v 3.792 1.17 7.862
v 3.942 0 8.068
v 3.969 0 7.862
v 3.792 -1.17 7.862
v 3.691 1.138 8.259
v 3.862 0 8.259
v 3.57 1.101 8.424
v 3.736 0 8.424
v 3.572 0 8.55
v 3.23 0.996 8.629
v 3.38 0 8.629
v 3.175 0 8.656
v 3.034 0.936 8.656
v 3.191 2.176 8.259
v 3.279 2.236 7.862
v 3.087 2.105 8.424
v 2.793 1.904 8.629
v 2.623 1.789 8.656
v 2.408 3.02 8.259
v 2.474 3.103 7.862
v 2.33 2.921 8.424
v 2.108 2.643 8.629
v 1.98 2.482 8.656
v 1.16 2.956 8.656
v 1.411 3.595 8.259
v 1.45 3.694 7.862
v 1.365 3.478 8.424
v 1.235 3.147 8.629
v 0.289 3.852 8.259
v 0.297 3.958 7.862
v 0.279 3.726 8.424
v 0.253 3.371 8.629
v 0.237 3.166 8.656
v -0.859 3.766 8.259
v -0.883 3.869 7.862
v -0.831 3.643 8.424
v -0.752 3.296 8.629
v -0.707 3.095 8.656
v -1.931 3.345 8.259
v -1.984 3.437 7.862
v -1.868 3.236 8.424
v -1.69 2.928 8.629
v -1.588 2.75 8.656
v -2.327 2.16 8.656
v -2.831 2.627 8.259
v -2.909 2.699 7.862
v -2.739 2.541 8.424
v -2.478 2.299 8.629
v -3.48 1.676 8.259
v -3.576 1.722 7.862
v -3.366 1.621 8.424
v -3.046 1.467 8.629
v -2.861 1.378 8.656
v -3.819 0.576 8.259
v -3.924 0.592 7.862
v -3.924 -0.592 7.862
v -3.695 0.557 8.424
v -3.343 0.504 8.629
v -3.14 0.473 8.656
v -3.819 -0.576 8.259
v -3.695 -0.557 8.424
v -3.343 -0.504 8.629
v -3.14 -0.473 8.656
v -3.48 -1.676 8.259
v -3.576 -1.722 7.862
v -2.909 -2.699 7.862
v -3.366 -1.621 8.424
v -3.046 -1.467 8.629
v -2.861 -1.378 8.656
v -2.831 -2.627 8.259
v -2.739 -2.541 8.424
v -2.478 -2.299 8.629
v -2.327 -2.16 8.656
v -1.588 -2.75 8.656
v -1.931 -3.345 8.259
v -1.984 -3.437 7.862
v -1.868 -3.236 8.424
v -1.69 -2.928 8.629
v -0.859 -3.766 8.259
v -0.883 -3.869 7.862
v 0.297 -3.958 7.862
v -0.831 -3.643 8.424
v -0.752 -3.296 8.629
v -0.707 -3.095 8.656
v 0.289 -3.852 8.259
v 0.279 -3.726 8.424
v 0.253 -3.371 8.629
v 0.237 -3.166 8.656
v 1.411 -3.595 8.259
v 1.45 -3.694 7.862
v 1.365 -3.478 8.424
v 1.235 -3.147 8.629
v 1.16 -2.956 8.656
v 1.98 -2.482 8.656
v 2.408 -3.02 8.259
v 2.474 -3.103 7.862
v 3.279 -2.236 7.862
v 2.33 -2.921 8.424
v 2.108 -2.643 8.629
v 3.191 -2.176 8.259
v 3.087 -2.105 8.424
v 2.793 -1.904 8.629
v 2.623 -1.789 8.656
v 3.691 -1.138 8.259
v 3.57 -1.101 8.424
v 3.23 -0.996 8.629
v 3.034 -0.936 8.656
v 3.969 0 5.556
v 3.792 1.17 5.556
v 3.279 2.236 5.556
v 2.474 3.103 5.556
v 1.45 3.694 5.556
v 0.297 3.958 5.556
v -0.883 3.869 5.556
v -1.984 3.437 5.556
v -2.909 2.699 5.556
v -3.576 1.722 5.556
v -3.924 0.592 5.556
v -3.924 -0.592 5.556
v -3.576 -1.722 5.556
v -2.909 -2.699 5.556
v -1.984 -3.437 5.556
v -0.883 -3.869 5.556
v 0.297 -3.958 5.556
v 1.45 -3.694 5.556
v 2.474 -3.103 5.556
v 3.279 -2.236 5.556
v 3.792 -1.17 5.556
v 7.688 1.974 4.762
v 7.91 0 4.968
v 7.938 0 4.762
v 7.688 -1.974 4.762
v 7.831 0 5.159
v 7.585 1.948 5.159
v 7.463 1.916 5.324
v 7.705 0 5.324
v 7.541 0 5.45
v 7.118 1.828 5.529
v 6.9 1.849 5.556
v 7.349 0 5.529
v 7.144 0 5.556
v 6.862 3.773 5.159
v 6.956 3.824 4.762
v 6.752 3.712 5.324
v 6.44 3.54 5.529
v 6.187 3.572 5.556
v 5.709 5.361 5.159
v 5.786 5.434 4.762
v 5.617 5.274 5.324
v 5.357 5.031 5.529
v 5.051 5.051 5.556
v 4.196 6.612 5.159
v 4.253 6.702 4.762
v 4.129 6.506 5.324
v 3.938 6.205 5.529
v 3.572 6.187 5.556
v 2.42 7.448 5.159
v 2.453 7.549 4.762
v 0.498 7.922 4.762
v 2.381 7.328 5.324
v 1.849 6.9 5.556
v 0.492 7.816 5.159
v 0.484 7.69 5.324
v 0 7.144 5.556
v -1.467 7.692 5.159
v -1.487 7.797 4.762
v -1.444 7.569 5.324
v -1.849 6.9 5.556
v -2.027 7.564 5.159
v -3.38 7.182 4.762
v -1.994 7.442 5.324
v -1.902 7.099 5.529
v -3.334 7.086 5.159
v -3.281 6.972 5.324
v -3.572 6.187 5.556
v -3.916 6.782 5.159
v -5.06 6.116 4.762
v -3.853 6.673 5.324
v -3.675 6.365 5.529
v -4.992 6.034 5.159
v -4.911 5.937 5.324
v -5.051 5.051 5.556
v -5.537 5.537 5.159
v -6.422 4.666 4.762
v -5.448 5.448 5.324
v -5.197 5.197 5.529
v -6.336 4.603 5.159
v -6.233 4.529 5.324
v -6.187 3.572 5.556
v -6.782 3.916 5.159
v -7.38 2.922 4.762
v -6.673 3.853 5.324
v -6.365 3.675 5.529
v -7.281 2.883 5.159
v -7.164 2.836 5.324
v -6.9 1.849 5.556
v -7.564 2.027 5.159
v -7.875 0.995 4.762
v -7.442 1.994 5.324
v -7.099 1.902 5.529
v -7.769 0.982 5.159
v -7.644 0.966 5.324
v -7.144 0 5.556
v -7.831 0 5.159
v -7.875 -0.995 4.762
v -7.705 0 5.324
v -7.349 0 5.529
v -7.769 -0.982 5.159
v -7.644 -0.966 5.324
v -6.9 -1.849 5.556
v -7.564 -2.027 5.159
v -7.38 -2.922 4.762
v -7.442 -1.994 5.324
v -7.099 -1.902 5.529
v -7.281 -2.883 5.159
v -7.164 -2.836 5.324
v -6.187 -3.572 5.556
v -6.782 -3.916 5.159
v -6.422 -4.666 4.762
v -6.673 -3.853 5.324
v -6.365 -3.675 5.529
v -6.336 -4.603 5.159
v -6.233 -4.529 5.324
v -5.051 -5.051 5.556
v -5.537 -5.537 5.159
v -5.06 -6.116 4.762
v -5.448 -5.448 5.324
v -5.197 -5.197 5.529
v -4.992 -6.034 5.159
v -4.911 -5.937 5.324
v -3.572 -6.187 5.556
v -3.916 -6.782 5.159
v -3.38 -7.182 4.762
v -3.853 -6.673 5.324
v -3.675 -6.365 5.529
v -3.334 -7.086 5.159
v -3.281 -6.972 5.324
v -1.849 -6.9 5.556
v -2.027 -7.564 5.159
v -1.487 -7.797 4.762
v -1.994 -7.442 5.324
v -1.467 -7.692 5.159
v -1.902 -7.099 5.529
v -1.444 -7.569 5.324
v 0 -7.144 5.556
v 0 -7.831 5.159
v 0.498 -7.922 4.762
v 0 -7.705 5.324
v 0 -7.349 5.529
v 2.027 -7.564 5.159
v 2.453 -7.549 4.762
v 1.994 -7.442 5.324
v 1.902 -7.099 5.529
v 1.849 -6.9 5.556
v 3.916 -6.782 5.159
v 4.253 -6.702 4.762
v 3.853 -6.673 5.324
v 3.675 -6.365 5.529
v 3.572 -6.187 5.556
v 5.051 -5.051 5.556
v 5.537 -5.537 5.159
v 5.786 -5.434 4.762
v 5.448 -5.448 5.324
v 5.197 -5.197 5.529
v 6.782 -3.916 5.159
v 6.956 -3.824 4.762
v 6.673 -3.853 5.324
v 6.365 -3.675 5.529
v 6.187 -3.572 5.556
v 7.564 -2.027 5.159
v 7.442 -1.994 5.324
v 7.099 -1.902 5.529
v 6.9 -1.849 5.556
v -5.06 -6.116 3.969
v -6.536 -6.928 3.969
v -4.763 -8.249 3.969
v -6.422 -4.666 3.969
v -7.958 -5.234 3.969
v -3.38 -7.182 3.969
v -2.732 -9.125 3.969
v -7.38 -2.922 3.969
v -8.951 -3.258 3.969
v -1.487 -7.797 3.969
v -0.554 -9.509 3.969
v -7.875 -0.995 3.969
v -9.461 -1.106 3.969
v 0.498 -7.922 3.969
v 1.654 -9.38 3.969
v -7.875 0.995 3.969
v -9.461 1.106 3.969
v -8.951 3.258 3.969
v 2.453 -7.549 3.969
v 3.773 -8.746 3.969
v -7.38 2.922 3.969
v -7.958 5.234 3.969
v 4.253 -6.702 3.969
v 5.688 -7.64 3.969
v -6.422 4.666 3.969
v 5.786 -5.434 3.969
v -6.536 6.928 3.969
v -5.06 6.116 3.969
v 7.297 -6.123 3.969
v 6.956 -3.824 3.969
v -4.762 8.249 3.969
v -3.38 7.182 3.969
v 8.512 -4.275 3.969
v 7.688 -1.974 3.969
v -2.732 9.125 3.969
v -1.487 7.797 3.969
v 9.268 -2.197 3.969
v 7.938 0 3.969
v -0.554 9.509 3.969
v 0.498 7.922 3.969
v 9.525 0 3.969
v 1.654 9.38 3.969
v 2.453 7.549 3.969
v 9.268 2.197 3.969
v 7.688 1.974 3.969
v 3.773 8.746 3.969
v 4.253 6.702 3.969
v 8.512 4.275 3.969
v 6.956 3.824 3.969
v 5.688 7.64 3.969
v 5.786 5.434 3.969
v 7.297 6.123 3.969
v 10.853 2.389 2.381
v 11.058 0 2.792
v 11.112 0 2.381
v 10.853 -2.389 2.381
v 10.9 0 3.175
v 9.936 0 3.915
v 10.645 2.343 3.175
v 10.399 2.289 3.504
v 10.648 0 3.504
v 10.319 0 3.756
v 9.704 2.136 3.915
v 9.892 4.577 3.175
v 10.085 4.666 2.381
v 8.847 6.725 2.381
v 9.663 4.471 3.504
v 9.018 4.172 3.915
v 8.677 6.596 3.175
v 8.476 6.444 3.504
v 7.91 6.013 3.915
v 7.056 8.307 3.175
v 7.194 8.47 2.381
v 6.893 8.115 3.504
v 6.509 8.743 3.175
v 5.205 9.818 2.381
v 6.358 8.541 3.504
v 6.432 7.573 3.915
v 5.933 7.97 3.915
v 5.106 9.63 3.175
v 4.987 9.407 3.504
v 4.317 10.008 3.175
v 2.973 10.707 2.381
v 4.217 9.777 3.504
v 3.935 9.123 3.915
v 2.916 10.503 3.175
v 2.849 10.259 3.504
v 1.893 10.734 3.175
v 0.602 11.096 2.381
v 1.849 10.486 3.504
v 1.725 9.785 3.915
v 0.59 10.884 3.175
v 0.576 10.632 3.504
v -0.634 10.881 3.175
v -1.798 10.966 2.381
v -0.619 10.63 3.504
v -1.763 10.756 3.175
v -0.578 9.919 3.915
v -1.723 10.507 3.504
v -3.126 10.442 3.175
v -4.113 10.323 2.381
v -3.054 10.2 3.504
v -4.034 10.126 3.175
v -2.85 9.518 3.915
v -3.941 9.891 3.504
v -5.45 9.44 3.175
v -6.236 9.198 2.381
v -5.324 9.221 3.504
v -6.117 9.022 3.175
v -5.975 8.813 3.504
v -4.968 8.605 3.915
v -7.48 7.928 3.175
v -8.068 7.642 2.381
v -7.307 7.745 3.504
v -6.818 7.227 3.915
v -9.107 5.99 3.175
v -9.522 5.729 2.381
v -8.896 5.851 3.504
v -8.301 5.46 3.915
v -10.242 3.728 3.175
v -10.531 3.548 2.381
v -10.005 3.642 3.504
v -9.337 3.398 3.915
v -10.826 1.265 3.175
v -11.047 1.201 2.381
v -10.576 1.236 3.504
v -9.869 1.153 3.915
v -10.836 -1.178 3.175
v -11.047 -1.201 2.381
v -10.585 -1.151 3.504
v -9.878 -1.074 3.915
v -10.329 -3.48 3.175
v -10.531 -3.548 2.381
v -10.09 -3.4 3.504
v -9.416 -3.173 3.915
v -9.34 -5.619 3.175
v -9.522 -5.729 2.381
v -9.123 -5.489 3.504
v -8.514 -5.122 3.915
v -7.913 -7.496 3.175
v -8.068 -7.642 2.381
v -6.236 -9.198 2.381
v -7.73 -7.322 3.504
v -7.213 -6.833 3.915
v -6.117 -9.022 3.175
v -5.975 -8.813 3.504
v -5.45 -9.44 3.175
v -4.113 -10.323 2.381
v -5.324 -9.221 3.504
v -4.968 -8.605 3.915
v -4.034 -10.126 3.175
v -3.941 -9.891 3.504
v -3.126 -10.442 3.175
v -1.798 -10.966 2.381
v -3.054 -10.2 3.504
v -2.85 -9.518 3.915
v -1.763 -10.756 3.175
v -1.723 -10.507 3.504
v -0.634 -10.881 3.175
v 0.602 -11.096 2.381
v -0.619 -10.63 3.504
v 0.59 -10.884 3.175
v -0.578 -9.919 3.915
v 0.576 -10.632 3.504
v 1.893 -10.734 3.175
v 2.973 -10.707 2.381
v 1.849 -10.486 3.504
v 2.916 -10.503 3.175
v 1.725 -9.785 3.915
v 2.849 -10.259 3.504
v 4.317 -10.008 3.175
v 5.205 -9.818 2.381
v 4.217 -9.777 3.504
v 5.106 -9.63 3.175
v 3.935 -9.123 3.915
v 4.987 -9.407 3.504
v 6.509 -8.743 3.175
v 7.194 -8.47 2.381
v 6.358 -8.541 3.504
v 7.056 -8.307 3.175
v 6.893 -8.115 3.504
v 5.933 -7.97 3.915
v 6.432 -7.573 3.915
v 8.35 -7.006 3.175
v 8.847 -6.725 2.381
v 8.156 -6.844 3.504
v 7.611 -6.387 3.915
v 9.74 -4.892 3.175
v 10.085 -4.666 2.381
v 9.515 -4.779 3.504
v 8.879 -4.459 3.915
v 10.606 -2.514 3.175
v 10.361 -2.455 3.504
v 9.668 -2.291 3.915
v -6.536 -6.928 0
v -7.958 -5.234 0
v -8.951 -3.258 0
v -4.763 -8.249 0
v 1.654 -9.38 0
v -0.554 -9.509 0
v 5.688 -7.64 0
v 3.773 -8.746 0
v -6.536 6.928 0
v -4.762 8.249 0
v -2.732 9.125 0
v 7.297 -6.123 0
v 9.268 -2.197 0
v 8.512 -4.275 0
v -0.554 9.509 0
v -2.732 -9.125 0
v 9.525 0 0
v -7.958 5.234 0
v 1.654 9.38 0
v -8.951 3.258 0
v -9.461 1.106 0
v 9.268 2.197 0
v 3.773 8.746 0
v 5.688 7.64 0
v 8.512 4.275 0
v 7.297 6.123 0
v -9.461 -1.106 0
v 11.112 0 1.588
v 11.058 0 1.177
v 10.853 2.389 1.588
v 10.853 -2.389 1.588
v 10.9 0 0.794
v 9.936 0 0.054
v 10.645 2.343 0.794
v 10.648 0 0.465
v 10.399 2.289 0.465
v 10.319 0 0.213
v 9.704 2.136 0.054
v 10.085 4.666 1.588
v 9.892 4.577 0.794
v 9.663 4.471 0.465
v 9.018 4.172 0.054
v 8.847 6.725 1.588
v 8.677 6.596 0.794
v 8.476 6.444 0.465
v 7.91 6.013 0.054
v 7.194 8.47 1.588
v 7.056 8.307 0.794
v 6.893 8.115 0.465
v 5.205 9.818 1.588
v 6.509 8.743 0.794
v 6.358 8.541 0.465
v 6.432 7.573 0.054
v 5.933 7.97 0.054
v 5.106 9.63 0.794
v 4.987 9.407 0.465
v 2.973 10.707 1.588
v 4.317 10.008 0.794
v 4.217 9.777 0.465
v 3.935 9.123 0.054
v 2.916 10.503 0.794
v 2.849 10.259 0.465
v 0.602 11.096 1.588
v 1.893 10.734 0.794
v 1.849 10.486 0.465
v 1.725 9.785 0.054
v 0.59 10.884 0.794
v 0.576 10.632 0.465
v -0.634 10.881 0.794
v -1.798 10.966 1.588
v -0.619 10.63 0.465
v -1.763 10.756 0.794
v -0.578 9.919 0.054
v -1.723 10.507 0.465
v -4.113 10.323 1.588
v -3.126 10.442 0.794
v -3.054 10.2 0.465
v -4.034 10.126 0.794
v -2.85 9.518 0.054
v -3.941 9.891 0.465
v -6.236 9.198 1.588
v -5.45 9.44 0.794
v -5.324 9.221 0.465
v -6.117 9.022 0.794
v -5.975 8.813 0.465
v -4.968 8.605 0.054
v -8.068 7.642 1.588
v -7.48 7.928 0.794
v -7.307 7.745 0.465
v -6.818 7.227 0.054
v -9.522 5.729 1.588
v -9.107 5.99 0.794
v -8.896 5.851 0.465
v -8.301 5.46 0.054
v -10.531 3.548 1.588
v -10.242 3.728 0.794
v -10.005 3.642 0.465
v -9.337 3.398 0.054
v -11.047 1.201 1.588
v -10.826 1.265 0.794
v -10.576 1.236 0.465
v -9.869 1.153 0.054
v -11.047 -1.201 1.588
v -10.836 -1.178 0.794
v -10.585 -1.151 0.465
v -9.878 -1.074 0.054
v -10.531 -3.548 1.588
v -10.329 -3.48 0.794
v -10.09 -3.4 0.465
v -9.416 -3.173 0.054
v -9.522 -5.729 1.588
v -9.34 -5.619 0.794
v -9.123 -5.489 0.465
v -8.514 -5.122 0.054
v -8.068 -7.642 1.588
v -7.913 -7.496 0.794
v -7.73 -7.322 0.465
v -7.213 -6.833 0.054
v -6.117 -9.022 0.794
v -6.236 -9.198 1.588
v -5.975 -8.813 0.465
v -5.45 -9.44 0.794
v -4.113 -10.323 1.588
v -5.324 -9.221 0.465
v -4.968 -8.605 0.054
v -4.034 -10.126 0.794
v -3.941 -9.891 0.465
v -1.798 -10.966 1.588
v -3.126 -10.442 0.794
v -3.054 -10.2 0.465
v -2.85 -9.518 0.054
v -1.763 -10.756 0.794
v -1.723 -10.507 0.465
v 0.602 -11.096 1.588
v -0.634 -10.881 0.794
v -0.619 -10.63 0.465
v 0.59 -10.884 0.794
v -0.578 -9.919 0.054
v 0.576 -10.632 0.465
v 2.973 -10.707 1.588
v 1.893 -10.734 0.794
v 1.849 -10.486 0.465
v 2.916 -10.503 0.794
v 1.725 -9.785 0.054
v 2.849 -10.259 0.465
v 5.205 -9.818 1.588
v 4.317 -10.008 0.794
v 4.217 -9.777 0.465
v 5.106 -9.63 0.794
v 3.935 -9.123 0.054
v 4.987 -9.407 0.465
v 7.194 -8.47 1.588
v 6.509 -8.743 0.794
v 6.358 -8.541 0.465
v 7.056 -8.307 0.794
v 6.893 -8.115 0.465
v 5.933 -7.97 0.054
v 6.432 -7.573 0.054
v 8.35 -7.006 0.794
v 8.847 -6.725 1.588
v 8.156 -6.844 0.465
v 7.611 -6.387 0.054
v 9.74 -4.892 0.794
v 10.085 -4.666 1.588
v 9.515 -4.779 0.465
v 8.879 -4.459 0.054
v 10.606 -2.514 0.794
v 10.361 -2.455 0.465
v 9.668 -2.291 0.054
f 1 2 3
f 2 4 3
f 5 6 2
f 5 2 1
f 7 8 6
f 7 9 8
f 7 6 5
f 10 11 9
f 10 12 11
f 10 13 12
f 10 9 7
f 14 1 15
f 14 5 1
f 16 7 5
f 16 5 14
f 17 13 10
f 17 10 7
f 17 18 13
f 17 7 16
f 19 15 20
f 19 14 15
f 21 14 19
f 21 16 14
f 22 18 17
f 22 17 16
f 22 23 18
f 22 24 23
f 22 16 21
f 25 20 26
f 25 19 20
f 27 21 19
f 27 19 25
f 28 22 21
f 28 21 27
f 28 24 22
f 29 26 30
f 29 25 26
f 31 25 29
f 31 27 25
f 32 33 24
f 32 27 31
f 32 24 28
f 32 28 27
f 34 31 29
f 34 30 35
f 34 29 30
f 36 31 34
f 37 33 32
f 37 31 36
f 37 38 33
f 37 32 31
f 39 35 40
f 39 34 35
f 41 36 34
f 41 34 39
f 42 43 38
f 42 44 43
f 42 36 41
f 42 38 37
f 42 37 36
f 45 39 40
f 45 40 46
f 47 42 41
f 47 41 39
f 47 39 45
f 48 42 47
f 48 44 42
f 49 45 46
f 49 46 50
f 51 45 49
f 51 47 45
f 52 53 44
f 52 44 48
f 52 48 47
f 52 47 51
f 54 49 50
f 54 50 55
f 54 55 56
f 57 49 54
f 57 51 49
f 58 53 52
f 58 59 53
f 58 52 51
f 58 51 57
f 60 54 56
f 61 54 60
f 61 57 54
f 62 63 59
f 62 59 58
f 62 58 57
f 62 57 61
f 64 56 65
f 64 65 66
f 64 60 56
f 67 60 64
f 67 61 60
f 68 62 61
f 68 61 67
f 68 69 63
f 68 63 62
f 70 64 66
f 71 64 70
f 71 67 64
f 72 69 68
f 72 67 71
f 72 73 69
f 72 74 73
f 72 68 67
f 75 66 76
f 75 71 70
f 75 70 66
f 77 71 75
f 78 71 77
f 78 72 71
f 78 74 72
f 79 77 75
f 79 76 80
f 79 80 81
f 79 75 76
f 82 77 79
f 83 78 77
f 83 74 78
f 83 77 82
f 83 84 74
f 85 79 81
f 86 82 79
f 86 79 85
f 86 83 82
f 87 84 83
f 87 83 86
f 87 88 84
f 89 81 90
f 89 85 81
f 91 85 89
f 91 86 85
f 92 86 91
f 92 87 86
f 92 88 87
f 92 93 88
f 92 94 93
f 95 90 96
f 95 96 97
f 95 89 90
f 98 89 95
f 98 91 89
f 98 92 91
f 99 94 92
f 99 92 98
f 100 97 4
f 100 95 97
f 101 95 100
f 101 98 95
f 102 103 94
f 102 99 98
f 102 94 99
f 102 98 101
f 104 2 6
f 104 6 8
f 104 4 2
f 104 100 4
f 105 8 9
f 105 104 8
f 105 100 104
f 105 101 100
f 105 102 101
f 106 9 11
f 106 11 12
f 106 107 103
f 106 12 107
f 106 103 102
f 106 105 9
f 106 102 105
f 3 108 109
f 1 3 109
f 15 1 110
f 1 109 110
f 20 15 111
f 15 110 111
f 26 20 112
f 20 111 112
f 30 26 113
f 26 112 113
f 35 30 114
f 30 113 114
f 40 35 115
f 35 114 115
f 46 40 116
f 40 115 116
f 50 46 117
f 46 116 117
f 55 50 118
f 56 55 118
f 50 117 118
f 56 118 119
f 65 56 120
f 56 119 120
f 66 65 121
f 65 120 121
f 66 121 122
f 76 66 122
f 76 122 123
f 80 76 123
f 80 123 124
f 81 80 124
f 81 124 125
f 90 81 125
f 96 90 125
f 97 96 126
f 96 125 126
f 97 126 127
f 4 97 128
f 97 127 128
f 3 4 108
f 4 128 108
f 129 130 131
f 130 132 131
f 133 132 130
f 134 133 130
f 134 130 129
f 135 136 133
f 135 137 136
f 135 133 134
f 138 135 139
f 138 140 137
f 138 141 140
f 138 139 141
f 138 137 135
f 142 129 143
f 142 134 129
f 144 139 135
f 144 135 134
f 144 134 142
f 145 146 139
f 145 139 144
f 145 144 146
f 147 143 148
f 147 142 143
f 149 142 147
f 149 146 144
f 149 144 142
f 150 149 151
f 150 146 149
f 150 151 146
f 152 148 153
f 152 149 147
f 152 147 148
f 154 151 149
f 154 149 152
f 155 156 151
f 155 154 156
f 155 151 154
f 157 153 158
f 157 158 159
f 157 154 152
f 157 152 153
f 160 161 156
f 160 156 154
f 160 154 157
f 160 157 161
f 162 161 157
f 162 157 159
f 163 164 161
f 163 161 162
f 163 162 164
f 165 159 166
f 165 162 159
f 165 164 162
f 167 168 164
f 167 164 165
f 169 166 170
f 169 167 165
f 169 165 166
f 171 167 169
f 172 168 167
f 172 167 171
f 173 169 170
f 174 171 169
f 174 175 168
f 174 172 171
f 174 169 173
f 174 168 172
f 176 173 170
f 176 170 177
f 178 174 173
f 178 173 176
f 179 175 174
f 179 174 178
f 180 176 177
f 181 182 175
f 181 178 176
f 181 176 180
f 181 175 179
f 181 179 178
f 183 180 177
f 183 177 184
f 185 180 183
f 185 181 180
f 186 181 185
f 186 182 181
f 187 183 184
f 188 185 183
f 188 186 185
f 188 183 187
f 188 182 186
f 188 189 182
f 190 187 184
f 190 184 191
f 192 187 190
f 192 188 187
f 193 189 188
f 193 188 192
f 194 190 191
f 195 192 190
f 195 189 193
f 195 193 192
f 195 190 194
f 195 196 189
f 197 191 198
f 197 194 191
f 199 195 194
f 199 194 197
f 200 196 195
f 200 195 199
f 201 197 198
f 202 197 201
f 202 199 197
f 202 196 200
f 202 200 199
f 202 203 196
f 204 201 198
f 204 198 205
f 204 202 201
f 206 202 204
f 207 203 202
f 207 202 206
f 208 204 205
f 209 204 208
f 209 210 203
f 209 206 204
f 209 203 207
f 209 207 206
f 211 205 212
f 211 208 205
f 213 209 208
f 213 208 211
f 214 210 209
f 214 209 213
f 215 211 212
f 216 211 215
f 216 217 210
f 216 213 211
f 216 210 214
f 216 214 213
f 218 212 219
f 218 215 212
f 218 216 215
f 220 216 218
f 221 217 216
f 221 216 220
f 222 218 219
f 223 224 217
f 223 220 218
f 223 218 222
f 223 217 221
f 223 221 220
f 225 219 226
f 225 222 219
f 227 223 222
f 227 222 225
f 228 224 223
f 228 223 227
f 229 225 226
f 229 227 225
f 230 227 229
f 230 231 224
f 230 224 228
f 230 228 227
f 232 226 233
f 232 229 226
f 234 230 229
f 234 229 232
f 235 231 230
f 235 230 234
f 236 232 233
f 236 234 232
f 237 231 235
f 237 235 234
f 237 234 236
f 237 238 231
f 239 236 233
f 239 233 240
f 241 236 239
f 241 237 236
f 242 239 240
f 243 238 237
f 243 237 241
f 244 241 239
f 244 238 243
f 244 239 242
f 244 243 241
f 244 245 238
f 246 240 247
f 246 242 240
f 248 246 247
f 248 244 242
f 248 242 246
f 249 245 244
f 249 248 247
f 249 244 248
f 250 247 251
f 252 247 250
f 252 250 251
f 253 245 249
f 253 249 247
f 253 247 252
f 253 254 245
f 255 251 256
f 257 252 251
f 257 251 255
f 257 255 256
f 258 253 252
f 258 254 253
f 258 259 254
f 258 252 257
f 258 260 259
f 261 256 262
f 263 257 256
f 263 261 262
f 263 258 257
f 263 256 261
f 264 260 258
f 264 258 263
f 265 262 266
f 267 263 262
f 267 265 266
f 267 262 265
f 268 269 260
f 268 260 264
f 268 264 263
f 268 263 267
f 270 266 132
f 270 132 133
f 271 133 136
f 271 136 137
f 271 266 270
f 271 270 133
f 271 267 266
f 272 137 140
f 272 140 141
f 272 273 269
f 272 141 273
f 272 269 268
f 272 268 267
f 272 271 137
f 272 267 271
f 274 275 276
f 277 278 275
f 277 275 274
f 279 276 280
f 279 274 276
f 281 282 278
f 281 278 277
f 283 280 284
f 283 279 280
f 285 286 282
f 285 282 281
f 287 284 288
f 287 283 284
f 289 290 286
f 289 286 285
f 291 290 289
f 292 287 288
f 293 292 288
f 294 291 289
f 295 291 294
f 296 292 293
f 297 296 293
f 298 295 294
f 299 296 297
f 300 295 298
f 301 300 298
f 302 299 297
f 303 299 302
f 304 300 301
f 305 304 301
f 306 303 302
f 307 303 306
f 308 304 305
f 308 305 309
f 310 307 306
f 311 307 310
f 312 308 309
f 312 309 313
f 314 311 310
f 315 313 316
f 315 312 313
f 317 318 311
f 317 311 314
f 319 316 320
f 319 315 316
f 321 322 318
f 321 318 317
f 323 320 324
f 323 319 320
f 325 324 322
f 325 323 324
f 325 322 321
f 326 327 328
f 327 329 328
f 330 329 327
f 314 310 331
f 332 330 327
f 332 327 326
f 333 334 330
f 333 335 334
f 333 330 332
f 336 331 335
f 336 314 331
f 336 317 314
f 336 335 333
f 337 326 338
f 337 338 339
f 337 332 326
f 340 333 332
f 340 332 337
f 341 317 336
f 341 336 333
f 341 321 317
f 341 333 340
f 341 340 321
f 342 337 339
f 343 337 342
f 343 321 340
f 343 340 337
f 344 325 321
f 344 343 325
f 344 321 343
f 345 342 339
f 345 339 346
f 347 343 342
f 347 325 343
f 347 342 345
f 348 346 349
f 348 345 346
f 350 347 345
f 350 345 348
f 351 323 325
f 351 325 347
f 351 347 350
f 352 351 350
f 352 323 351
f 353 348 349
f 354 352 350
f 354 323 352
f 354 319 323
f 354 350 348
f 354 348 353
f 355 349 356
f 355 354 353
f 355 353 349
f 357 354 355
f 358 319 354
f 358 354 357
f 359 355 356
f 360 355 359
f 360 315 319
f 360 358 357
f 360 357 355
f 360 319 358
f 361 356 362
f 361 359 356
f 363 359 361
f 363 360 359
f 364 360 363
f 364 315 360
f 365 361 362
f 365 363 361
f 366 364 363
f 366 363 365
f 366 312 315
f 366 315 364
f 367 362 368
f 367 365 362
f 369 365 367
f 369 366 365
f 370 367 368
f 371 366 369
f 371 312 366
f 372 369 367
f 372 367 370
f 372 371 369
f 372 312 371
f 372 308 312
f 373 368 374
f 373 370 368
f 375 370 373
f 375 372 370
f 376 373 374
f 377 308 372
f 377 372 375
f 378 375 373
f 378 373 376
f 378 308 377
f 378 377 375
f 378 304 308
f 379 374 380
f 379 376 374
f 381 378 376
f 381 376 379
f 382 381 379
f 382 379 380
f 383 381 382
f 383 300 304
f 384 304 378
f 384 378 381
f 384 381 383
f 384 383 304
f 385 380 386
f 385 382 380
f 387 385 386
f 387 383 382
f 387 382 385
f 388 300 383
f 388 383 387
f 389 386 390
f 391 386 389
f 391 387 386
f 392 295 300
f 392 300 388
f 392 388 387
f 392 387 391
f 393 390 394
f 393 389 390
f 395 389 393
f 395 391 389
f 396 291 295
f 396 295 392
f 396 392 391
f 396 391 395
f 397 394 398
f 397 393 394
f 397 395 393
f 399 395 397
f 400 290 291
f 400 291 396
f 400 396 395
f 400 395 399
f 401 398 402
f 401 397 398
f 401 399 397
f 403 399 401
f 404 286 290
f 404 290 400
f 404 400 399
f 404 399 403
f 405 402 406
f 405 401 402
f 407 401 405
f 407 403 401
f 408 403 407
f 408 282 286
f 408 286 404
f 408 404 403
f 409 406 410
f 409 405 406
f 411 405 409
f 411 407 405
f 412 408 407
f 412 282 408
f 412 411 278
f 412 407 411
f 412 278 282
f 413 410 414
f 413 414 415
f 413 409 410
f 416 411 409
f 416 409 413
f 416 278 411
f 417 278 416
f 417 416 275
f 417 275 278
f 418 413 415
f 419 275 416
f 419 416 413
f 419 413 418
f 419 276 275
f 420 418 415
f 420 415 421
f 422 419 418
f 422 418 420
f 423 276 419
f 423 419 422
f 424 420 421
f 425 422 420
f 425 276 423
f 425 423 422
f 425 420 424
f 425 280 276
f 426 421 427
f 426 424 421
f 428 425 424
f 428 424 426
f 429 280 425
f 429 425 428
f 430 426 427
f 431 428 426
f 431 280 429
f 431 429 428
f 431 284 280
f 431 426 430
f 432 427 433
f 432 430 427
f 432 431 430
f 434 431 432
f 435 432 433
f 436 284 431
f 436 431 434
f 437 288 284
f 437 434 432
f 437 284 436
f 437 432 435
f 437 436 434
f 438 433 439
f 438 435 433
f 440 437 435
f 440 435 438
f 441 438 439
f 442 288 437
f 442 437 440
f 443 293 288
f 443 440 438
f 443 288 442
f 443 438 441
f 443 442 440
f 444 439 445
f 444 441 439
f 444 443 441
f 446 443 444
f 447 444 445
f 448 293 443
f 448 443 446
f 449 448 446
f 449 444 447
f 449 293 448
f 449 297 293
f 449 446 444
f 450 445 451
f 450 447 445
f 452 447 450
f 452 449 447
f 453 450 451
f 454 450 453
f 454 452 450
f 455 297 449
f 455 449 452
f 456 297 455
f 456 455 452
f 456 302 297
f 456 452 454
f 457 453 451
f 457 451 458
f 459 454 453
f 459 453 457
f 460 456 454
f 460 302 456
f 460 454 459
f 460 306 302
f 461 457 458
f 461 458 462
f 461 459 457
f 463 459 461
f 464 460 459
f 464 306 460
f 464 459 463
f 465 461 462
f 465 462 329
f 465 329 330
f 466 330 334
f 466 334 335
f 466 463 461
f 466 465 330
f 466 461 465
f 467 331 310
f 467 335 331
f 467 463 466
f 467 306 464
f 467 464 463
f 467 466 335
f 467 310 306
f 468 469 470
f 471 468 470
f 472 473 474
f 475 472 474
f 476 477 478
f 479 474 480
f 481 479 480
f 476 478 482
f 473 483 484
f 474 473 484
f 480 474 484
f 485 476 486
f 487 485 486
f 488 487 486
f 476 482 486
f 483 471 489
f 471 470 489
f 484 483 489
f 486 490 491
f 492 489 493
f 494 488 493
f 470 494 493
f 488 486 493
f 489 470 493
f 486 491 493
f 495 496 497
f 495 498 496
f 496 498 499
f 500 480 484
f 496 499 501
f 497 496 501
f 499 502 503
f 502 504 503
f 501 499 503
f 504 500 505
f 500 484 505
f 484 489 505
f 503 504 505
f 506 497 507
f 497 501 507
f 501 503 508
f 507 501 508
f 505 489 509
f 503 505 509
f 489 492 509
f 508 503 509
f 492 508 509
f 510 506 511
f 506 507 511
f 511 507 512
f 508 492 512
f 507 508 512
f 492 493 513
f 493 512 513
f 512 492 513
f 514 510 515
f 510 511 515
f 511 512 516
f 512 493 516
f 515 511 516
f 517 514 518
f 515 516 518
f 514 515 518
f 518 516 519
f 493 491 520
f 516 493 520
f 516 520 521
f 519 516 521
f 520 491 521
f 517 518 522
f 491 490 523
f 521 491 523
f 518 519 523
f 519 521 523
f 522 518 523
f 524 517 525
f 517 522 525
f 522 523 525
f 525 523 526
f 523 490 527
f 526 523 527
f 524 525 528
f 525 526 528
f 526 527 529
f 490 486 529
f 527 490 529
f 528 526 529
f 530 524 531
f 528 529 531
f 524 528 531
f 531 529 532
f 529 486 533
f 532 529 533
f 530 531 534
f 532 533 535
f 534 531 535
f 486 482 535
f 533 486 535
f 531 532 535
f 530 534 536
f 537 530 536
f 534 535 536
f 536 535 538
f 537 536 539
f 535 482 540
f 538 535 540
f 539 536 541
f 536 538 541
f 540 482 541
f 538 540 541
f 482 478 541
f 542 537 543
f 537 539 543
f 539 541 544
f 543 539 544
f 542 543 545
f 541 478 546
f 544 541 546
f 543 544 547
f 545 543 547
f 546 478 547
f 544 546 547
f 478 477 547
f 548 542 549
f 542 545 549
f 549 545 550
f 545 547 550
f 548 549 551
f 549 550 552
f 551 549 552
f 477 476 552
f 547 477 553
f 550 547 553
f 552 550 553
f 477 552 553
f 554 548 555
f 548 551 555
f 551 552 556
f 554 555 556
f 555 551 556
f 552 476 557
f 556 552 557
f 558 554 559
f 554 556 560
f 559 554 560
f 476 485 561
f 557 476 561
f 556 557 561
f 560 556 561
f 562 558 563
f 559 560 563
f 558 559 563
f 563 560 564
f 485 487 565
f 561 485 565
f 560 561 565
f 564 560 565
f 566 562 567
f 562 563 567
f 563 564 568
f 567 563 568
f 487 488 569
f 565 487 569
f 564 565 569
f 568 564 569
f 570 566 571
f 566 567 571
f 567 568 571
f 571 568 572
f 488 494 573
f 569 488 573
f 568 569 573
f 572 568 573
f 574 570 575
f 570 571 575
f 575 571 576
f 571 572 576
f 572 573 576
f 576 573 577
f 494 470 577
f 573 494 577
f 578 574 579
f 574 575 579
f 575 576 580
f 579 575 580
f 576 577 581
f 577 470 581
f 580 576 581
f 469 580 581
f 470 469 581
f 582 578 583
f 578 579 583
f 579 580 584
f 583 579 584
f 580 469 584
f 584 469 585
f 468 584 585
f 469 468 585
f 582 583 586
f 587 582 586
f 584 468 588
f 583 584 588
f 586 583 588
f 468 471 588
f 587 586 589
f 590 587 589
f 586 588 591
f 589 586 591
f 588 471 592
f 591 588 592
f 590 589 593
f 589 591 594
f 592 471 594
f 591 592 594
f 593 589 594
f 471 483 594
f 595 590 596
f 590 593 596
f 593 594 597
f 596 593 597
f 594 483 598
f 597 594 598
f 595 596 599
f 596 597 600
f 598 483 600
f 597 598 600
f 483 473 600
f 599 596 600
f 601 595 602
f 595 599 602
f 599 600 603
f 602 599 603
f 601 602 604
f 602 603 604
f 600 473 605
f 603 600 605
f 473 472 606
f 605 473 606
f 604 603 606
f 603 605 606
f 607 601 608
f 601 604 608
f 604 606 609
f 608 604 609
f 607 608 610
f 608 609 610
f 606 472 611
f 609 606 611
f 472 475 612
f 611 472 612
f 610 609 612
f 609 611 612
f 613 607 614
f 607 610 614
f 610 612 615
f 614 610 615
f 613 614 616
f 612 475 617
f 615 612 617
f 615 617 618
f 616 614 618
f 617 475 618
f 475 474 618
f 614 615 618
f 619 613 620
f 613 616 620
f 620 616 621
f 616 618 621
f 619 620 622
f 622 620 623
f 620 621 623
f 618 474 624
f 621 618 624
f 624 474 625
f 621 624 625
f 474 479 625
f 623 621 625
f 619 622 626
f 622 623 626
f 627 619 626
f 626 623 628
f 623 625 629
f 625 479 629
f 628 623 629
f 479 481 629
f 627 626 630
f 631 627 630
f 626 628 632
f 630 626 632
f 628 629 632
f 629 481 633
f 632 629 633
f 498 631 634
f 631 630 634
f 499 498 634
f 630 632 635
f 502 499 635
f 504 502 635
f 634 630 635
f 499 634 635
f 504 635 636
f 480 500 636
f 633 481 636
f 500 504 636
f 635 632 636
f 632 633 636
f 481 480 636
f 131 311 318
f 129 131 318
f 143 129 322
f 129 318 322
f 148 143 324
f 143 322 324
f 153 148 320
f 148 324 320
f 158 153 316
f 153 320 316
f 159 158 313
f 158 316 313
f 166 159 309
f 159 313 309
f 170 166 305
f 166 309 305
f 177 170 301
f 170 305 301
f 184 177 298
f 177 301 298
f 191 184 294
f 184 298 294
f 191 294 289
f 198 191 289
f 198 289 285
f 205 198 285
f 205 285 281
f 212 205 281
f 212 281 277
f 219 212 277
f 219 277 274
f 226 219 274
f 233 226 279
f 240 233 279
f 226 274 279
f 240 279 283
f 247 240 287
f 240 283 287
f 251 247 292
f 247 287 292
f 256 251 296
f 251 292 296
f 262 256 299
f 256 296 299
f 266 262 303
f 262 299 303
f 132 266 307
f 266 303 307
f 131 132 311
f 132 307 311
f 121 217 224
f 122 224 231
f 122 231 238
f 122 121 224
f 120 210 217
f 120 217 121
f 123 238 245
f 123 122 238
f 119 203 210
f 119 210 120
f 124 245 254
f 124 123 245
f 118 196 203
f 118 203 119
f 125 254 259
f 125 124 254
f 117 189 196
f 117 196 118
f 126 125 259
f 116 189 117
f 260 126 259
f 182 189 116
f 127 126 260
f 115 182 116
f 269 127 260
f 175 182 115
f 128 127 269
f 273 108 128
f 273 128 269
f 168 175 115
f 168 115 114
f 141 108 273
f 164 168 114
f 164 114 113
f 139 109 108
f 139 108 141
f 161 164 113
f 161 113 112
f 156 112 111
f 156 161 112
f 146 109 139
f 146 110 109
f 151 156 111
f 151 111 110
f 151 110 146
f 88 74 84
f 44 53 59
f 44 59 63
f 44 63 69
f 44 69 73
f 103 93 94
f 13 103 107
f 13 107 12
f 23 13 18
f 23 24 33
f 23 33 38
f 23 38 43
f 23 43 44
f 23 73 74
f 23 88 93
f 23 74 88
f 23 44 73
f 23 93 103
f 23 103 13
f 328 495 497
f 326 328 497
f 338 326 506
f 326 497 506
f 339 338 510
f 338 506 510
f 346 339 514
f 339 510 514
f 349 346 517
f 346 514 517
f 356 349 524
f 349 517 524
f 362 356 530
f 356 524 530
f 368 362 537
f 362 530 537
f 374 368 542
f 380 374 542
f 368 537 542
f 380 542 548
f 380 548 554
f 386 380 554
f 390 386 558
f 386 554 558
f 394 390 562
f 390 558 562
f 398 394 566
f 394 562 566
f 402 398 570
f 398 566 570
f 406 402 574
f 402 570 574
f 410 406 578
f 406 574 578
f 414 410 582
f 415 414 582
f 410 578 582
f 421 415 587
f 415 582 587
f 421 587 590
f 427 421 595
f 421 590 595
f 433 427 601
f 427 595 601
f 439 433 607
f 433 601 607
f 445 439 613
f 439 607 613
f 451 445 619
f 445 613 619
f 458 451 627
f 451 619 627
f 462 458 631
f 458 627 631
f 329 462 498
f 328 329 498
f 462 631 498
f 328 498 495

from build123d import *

# Parameters (mm, degrees)
CYLINDER_R     = 11.1125
CYLINDER_DEPTH = 3.96875
FILLET002_R    = 1.5875
FILLET003_R    = 1.5875
SKETCH001_R    = 7.9375
PAD001_DEPTH   = 1.5875
FILLET004_R    = 0.79375
SKETCH002_R    = 3.96875
PAD002_DEPTH   = 3.1
FILLET005_R    = 0.79375


with BuildPart() as part:
    # Cylinder → Cylinder (new body)
    with BuildSketch(Plane.XY):
        Circle(CYLINDER_R)
    extrude(amount=CYLINDER_DEPTH)

    # Fillet002
    fillet002_edges = [part.edges().sort_by_distance(p)[0] for p in [
        (-11.1125, 0, 3.96875),
    ]]
    fillet(fillet002_edges, radius=FILLET002_R)

    # Fillet003
    fillet003_edges = [part.edges().sort_by_distance(p)[0] for p in [
        (-11.1125, 0, 0),
    ]]
    fillet(fillet003_edges, radius=FILLET003_R)

    # Sketch001 → Pad001 (new body)
    with BuildSketch(Plane.XY.offset(3.96875)):
        Circle(SKETCH001_R)
    extrude(amount=PAD001_DEPTH)

    # Fillet004
    fillet004_edges = [part.edges().sort_by_distance(p)[0] for p in [
        (-7.9375, 0, 5.55625),
    ]]
    fillet(fillet004_edges, radius=FILLET004_R)

    # Sketch002 → Pad002 (new body)
    with BuildSketch(Plane.XY.offset(5.55625)):
        Circle(SKETCH002_R)
    extrude(amount=PAD002_DEPTH)

    # Fillet005
    fillet005_edges = [part.edges().sort_by_distance(p)[0] for p in [
        (-3.96875, 0, 8.65625),
    ]]
    fillet(fillet005_edges, radius=FILLET005_R)


solid = part.part
